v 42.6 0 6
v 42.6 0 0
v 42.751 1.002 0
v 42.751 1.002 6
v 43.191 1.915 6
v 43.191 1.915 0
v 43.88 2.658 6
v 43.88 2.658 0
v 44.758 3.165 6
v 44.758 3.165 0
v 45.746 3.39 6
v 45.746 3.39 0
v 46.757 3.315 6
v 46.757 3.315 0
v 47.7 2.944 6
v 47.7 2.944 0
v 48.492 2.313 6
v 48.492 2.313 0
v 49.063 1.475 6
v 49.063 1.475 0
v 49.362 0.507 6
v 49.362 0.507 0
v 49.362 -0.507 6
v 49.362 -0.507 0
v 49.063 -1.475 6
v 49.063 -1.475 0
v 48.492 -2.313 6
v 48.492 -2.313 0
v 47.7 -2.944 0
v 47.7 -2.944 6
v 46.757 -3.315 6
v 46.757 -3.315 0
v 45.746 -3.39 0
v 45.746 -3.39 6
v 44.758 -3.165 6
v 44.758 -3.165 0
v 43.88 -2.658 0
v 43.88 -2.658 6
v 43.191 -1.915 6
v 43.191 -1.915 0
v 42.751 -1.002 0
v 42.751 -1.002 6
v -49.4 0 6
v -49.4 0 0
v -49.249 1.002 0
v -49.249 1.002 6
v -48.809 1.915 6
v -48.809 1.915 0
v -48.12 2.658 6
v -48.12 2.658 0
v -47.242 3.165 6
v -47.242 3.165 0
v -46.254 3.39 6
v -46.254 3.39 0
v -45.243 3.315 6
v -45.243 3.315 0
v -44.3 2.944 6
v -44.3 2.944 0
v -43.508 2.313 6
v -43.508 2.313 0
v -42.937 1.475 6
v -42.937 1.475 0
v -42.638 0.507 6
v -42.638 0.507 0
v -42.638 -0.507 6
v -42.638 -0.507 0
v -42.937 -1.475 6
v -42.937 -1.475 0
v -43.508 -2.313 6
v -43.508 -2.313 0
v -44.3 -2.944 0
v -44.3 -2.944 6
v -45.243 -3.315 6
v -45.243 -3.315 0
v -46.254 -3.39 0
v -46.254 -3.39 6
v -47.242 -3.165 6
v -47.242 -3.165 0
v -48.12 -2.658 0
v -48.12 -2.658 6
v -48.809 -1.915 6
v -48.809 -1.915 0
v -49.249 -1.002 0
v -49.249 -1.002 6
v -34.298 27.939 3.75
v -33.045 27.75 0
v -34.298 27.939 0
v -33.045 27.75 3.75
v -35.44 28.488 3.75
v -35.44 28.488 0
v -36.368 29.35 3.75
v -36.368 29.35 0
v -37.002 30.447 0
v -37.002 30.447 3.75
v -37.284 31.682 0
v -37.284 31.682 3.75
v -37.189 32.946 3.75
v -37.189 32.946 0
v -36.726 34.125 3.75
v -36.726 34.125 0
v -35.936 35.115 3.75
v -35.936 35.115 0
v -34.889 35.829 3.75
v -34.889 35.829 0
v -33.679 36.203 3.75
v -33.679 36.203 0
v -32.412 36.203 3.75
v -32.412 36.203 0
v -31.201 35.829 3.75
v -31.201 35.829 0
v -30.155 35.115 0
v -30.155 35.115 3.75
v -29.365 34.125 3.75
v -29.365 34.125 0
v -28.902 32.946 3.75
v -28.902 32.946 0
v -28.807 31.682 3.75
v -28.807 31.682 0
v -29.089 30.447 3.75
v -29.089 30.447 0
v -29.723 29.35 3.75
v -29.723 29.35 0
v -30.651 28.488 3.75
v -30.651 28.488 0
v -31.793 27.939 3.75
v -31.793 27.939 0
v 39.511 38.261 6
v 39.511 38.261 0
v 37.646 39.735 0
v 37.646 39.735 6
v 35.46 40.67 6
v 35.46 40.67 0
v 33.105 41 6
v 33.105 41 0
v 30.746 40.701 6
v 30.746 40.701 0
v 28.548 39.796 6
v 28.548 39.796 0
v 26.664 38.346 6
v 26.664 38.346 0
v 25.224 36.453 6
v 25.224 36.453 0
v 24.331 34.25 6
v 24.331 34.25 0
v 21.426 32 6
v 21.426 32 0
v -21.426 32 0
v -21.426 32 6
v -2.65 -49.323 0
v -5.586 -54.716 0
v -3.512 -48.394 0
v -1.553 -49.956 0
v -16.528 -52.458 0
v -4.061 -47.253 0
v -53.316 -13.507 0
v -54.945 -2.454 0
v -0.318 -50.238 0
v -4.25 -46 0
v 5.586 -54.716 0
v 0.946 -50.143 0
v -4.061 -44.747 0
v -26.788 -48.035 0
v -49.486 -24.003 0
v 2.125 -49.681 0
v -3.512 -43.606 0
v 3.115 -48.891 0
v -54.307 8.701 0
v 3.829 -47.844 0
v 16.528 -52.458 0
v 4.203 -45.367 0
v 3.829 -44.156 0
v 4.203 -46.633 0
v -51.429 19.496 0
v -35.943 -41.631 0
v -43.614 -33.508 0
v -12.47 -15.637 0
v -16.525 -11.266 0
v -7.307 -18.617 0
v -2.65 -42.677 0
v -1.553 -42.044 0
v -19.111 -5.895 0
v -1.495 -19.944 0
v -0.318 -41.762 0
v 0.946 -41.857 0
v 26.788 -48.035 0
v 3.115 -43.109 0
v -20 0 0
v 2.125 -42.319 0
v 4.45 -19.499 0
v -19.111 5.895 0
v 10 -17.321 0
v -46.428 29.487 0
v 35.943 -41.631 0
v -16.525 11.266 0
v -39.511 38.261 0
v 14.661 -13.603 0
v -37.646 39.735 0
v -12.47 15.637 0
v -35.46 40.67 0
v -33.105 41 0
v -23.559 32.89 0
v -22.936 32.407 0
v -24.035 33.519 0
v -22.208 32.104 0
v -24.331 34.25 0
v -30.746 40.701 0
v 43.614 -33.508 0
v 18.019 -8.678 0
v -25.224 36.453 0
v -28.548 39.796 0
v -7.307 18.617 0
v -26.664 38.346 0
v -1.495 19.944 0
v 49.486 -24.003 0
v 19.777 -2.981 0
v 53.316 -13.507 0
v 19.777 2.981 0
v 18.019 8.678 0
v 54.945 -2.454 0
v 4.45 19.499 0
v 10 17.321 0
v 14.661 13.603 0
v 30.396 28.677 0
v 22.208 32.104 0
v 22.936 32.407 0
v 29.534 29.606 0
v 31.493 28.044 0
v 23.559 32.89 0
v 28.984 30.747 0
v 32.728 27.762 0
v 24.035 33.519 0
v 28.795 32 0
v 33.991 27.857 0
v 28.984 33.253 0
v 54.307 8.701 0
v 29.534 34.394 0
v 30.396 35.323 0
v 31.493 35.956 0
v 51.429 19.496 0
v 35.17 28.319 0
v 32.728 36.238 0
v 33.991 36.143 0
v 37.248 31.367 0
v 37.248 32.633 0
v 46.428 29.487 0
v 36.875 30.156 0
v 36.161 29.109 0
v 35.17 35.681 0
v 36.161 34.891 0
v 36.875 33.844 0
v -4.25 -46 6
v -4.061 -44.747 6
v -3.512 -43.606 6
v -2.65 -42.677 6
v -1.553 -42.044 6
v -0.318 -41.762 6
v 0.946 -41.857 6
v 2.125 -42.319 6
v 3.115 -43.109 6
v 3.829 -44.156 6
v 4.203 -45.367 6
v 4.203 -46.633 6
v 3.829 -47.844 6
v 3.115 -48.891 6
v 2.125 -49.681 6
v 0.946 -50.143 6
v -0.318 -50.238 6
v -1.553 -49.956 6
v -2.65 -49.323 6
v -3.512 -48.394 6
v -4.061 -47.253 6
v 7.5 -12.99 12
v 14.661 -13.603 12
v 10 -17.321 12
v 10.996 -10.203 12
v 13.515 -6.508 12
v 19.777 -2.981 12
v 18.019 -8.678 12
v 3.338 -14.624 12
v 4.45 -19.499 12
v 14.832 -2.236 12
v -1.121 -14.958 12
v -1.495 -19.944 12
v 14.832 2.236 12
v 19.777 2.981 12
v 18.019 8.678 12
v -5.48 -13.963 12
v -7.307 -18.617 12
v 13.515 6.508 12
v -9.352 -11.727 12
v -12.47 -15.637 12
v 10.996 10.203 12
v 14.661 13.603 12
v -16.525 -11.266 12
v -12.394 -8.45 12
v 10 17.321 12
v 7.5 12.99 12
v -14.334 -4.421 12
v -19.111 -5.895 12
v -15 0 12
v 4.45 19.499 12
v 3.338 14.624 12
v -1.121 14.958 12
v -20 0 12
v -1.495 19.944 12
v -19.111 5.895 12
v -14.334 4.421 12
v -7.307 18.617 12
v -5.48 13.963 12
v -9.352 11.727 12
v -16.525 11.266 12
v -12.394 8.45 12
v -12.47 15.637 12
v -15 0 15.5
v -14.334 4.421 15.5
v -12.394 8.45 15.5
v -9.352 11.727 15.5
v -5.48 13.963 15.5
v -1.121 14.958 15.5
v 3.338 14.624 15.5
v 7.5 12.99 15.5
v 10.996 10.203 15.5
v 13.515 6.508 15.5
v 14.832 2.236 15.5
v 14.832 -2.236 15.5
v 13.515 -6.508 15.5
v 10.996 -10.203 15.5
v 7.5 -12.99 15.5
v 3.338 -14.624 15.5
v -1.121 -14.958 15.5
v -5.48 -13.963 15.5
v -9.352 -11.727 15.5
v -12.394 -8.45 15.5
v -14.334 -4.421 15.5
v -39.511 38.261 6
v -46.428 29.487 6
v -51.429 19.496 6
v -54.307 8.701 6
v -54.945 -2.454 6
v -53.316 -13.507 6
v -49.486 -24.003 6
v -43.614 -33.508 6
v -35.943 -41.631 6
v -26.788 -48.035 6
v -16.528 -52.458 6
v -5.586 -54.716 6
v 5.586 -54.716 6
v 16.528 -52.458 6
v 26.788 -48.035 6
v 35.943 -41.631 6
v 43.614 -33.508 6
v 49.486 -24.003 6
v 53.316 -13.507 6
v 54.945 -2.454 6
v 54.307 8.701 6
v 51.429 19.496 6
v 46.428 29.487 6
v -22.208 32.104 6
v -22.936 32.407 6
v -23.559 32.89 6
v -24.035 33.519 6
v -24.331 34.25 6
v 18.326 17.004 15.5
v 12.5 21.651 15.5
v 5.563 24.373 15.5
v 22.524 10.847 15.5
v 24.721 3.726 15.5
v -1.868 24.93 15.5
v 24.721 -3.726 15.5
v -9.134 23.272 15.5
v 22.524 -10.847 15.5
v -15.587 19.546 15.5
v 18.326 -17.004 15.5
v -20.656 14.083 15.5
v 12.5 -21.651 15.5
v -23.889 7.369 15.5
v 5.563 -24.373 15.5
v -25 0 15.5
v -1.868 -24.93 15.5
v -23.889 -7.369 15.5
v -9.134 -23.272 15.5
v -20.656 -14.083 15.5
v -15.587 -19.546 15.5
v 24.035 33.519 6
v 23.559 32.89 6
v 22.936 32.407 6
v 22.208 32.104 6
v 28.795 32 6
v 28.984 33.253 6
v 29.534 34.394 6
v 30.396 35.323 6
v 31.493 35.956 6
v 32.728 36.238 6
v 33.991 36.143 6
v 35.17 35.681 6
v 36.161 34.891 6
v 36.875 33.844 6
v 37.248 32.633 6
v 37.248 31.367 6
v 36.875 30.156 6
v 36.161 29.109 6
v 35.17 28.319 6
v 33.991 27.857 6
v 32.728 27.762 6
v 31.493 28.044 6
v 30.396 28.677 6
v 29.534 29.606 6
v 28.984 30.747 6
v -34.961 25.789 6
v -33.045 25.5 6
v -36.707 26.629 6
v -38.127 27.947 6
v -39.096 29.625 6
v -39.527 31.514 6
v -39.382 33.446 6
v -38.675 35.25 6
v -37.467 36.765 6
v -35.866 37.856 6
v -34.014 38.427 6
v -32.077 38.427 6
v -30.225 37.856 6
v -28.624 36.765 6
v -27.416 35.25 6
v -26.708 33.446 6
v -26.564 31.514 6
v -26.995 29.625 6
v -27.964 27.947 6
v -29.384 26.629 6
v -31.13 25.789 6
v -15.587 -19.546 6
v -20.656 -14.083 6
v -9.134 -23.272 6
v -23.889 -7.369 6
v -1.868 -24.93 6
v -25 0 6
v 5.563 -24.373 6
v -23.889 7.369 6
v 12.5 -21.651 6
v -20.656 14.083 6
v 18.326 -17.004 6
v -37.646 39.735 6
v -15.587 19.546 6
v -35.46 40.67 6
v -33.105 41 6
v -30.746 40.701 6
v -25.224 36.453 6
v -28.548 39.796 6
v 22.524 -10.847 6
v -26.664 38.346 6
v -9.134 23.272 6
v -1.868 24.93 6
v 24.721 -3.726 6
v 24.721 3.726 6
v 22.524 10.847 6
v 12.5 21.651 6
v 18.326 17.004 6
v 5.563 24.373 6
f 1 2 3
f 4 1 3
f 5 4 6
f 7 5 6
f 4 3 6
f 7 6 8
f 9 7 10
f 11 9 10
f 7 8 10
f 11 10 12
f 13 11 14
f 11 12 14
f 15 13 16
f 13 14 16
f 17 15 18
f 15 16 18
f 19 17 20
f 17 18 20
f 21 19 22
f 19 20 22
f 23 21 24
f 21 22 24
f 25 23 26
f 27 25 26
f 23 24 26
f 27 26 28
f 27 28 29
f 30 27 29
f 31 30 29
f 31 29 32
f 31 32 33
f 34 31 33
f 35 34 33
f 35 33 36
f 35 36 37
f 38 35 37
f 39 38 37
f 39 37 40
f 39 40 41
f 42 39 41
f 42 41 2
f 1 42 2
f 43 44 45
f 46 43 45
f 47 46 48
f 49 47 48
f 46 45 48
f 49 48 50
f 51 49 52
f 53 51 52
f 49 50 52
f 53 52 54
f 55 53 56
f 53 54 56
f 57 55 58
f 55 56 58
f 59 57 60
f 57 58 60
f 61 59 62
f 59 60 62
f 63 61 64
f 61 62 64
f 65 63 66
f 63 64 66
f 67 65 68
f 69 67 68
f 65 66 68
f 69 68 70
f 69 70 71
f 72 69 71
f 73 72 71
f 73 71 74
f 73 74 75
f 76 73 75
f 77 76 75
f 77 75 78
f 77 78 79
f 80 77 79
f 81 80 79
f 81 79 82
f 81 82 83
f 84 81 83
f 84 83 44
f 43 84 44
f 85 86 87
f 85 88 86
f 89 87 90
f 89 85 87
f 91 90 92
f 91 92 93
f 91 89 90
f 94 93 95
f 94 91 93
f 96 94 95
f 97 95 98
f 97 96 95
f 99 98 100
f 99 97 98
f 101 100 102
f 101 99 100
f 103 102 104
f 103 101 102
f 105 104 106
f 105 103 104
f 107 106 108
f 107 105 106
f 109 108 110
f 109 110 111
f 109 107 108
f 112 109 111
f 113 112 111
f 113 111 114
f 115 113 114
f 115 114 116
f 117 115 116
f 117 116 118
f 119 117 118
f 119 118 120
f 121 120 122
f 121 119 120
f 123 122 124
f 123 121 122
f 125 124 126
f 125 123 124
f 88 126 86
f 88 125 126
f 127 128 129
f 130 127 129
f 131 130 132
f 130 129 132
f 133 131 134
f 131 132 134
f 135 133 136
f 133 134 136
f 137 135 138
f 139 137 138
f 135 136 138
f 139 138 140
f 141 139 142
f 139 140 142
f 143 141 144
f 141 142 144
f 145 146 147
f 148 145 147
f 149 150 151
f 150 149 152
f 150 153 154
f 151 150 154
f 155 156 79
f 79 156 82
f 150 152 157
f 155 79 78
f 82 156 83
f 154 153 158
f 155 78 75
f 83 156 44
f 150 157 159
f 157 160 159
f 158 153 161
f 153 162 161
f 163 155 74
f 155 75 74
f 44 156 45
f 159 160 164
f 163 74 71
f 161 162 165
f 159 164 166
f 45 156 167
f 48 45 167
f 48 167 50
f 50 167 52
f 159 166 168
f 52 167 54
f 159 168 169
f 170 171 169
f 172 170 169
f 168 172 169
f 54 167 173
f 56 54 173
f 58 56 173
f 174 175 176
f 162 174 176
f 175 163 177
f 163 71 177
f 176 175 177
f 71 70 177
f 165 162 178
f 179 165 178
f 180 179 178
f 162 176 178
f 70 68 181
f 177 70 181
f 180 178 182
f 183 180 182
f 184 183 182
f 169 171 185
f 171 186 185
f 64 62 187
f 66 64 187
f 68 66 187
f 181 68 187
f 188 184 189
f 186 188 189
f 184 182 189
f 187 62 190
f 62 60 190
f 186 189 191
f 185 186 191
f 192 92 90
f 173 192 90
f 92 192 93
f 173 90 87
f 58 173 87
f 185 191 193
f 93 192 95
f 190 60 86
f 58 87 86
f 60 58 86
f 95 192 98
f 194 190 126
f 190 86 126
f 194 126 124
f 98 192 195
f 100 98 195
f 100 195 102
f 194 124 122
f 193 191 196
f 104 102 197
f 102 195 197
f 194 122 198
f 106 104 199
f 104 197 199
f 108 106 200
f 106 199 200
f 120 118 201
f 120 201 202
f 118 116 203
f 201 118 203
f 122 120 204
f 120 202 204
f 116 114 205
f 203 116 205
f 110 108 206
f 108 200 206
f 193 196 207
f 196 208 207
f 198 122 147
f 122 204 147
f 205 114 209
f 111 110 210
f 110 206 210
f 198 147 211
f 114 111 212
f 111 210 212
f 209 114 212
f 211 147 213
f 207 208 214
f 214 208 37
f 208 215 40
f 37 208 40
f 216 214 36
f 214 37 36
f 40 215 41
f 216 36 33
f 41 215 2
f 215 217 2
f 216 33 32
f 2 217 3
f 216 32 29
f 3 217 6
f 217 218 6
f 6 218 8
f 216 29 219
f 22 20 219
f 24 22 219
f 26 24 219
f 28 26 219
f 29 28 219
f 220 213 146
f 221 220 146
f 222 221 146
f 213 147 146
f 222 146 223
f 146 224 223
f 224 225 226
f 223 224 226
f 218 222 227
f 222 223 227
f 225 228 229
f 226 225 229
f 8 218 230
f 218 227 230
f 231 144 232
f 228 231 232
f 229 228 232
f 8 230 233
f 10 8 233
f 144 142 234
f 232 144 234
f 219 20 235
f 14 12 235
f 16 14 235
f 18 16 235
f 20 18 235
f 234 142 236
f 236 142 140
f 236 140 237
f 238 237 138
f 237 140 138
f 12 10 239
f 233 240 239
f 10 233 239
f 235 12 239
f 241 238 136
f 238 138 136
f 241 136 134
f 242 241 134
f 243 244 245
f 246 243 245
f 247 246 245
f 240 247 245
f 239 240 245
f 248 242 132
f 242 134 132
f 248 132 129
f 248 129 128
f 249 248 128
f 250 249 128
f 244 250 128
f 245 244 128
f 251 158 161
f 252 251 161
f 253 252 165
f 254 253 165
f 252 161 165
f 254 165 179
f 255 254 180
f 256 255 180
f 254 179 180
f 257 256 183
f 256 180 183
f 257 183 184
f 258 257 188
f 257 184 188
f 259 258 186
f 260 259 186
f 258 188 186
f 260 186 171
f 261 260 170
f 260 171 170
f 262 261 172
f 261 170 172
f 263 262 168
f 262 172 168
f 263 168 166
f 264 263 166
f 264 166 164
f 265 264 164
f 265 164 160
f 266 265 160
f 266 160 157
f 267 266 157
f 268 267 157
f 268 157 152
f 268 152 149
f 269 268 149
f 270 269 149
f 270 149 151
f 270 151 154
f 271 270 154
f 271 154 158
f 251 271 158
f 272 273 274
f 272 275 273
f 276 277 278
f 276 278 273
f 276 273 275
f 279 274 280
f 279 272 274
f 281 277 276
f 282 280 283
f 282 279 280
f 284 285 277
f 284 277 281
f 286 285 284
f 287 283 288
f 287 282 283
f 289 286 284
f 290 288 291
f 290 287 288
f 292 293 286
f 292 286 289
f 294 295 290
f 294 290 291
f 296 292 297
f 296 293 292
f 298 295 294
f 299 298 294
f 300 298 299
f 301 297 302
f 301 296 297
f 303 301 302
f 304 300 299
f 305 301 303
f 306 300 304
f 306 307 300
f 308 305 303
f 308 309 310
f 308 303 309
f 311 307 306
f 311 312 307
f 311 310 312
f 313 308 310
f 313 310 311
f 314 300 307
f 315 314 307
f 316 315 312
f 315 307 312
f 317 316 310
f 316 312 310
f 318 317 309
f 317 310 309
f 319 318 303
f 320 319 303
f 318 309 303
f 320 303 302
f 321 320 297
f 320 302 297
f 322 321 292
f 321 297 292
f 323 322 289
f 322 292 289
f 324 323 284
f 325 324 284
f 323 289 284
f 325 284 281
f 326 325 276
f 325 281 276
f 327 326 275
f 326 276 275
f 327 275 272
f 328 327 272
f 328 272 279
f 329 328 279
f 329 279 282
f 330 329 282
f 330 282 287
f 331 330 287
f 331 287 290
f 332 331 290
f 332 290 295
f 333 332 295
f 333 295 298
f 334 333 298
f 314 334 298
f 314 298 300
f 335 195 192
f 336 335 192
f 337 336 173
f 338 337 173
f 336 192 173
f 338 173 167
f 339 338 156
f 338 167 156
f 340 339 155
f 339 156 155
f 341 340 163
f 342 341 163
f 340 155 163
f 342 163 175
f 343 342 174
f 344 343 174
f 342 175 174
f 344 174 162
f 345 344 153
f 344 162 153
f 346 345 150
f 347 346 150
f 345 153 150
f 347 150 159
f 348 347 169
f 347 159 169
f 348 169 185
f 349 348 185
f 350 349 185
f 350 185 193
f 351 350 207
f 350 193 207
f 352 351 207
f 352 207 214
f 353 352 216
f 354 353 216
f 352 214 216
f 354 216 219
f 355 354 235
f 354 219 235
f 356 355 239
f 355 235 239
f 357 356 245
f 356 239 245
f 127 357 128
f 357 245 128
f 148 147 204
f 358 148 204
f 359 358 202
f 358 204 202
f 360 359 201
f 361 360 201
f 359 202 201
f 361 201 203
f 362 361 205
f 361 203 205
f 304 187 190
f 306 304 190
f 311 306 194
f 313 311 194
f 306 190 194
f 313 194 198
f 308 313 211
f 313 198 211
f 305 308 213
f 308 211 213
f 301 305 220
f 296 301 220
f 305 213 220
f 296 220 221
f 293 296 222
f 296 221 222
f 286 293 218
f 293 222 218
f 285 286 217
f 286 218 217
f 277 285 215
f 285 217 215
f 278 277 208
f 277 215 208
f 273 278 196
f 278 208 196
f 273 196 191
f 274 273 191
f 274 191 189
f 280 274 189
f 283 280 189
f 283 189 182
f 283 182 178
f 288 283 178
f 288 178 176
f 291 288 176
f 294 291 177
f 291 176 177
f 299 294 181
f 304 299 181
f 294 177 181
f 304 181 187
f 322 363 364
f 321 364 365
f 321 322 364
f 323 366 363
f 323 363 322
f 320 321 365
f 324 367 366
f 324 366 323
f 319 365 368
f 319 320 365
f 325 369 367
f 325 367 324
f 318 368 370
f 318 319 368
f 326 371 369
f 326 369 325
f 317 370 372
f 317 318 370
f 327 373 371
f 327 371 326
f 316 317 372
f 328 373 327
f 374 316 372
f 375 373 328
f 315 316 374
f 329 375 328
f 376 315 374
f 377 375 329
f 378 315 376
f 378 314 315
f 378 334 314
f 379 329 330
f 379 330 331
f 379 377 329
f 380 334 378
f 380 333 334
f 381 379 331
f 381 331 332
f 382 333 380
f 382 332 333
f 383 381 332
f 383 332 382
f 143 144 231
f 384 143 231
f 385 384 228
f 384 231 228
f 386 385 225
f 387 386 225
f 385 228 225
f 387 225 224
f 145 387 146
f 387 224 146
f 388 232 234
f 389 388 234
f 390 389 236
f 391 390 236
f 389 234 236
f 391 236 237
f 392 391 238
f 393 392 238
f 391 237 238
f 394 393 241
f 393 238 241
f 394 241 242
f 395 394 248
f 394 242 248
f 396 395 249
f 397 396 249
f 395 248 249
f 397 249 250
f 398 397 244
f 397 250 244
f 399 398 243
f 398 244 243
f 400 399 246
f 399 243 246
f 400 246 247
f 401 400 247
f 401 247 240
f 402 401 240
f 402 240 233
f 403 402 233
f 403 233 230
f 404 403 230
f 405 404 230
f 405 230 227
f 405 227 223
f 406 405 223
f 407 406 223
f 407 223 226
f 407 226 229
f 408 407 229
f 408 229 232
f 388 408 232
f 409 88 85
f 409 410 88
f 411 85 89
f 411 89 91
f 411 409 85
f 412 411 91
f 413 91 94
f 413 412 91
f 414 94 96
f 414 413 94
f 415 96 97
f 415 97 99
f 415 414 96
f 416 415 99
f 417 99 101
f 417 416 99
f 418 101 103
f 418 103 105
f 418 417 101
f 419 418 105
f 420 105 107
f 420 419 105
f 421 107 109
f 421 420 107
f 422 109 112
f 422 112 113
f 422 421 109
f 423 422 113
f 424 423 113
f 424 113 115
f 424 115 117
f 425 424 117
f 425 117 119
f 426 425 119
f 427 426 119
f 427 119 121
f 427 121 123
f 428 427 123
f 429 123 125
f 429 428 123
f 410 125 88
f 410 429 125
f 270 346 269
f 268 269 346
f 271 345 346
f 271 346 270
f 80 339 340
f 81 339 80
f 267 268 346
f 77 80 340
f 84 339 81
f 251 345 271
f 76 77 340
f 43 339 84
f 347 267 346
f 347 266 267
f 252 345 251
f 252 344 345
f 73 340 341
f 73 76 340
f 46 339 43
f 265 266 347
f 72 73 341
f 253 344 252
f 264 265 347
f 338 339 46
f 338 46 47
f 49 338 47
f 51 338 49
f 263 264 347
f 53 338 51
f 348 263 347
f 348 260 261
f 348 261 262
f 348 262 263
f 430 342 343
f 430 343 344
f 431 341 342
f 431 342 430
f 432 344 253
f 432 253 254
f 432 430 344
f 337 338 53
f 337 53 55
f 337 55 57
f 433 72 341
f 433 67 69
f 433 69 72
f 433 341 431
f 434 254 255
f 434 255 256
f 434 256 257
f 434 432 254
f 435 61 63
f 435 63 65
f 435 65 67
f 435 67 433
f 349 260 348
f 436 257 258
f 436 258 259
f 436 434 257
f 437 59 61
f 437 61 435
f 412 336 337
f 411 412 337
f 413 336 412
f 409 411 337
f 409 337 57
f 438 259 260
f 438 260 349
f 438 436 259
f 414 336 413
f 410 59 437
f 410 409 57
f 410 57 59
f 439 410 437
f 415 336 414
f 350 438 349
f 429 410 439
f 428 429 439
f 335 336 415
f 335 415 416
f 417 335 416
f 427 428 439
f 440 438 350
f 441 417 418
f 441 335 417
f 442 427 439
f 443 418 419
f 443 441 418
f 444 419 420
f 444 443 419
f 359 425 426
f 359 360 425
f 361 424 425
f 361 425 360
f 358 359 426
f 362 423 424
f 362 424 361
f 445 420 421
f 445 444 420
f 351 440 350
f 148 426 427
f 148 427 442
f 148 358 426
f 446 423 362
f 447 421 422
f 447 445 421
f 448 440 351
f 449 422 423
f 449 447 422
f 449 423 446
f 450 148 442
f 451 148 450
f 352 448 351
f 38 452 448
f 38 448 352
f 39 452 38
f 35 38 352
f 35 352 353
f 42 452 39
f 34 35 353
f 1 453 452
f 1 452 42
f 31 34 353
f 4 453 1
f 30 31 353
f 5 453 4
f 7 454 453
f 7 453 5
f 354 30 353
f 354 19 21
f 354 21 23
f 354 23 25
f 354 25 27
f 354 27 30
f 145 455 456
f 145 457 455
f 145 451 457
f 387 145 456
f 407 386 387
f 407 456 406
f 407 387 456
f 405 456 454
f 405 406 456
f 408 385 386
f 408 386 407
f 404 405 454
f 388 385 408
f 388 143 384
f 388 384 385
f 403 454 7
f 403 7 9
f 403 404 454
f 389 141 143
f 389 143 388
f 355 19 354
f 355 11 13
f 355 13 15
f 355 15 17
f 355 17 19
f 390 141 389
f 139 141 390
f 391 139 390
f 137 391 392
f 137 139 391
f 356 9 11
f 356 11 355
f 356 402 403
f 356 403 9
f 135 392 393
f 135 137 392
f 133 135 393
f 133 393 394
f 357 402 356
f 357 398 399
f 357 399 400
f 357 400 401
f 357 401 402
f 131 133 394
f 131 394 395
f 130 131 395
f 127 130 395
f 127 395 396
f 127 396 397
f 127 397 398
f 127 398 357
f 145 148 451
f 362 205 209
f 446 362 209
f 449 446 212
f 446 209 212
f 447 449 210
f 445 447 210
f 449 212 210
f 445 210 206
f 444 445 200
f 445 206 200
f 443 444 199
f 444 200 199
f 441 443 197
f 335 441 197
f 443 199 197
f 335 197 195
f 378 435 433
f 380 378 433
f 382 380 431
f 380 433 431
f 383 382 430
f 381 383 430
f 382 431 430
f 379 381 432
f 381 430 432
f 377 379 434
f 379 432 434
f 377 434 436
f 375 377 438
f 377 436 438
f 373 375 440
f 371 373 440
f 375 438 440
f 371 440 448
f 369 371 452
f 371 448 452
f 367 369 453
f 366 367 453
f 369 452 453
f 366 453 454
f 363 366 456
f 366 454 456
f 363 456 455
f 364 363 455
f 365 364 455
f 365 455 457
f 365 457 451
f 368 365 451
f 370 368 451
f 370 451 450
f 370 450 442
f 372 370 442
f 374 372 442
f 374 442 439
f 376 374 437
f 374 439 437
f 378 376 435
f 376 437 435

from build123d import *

# Parameters (mm, degrees)
EXTRUDE_1_DEPTH     = 6
SKETCH_2_R          = 25
EXTRUDE_2_DEPTH     = 9.5
SKETCH_3_R          = 20
CUT_EXTRUDE_1_DEPTH = 12
SKETCH_4_R          = 15
CUT_EXTRUDE_2_DEPTH = 79.70196948
HOLE_WIZARD_1_D     = 8.5
HOLE_WIZARD_1_DEPTH = 93.98
HOLE_WIZARD_M8_1_D  = 6.8


with BuildPart() as part:
    # 草图1 → 凸台-拉伸1 (new body)
    with BuildSketch(Plane.XY):
        with BuildLine():
            Line((21.426473245, 32), (-21.426473245, 32))
            ThreePointArc((-21.426473245, 32), (-23.263590552, 32.628291755), (-24.331210755, 34.25))
            ThreePointArc((-24.331210755, 34.25), (-30.746282552, 40.701376437), (-39.510832187, 38.260869565))
            ThreePointArc((-39.510832187, 38.260869565), (0, -55), (39.510832187, 38.260869565))
            ThreePointArc((39.510832187, 38.260869565), (30.746282552, 40.701376437), (24.331210755, 34.25))
            ThreePointArc((24.331210755, 34.25), (23.263590552, 32.628291755), (21.426473245, 32))
        make_face()
    extrude(amount=EXTRUDE_1_DEPTH)

    # 草图2 → 凸台-拉伸2 (add)
    with BuildSketch(Plane.XY.offset(6)):
        with Locations(Location((0, 0, 0), (0, 0, 180))):
            Circle(SKETCH_2_R)
    extrude(amount=EXTRUDE_2_DEPTH)

    # 草图3 → 切除-拉伸1 (cut)
    with BuildSketch(Plane(origin=(0, 0, 0), x_dir=(-1, 0, 0), z_dir=(0, 0, -1))):
        Circle(SKETCH_3_R)
    extrude(amount=-CUT_EXTRUDE_1_DEPTH, mode=Mode.SUBTRACT)

    # 草图4 → 切除-拉伸2 (cut, through all)
    with BuildSketch(Plane(origin=(0, 0, 12), x_dir=(-1, 0, 0), z_dir=(0, 0, -1))):
        Circle(SKETCH_4_R)
    extrude(amount=-CUT_EXTRUDE_2_DEPTH, mode=Mode.SUBTRACT)

    # 孔1
    with Locations(Plane.XY.offset(6)):
        with Locations((33.045423284, 32), (0, -46)):
            Hole(HOLE_WIZARD_1_D / 2, depth=HOLE_WIZARD_1_DEPTH)

    # M8 螺纹孔1 (through all)
    with Locations(Plane.XY.offset(6)):
        with Locations((46, 0), (-46, 0)):
            Hole(HOLE_WIZARD_M8_1_D / 2)

    # 草图11 → Ø8.5 (8.5) 直径孔1 (revolve, cut)
    with BuildSketch(Plane(origin=(-33.045423284, 32, 6), x_dir=(0, -1, 0), z_dir=(1, 0, 0))):
        Polygon((0, 0), (0, 6), (4.25, 6), (4.25, 2.25), (6.5, 0), align=None)
    revolve(axis=Axis((-33.045423284, 32, 12.35), (0, 0, -1)), mode=Mode.SUBTRACT)


solid = part.part
